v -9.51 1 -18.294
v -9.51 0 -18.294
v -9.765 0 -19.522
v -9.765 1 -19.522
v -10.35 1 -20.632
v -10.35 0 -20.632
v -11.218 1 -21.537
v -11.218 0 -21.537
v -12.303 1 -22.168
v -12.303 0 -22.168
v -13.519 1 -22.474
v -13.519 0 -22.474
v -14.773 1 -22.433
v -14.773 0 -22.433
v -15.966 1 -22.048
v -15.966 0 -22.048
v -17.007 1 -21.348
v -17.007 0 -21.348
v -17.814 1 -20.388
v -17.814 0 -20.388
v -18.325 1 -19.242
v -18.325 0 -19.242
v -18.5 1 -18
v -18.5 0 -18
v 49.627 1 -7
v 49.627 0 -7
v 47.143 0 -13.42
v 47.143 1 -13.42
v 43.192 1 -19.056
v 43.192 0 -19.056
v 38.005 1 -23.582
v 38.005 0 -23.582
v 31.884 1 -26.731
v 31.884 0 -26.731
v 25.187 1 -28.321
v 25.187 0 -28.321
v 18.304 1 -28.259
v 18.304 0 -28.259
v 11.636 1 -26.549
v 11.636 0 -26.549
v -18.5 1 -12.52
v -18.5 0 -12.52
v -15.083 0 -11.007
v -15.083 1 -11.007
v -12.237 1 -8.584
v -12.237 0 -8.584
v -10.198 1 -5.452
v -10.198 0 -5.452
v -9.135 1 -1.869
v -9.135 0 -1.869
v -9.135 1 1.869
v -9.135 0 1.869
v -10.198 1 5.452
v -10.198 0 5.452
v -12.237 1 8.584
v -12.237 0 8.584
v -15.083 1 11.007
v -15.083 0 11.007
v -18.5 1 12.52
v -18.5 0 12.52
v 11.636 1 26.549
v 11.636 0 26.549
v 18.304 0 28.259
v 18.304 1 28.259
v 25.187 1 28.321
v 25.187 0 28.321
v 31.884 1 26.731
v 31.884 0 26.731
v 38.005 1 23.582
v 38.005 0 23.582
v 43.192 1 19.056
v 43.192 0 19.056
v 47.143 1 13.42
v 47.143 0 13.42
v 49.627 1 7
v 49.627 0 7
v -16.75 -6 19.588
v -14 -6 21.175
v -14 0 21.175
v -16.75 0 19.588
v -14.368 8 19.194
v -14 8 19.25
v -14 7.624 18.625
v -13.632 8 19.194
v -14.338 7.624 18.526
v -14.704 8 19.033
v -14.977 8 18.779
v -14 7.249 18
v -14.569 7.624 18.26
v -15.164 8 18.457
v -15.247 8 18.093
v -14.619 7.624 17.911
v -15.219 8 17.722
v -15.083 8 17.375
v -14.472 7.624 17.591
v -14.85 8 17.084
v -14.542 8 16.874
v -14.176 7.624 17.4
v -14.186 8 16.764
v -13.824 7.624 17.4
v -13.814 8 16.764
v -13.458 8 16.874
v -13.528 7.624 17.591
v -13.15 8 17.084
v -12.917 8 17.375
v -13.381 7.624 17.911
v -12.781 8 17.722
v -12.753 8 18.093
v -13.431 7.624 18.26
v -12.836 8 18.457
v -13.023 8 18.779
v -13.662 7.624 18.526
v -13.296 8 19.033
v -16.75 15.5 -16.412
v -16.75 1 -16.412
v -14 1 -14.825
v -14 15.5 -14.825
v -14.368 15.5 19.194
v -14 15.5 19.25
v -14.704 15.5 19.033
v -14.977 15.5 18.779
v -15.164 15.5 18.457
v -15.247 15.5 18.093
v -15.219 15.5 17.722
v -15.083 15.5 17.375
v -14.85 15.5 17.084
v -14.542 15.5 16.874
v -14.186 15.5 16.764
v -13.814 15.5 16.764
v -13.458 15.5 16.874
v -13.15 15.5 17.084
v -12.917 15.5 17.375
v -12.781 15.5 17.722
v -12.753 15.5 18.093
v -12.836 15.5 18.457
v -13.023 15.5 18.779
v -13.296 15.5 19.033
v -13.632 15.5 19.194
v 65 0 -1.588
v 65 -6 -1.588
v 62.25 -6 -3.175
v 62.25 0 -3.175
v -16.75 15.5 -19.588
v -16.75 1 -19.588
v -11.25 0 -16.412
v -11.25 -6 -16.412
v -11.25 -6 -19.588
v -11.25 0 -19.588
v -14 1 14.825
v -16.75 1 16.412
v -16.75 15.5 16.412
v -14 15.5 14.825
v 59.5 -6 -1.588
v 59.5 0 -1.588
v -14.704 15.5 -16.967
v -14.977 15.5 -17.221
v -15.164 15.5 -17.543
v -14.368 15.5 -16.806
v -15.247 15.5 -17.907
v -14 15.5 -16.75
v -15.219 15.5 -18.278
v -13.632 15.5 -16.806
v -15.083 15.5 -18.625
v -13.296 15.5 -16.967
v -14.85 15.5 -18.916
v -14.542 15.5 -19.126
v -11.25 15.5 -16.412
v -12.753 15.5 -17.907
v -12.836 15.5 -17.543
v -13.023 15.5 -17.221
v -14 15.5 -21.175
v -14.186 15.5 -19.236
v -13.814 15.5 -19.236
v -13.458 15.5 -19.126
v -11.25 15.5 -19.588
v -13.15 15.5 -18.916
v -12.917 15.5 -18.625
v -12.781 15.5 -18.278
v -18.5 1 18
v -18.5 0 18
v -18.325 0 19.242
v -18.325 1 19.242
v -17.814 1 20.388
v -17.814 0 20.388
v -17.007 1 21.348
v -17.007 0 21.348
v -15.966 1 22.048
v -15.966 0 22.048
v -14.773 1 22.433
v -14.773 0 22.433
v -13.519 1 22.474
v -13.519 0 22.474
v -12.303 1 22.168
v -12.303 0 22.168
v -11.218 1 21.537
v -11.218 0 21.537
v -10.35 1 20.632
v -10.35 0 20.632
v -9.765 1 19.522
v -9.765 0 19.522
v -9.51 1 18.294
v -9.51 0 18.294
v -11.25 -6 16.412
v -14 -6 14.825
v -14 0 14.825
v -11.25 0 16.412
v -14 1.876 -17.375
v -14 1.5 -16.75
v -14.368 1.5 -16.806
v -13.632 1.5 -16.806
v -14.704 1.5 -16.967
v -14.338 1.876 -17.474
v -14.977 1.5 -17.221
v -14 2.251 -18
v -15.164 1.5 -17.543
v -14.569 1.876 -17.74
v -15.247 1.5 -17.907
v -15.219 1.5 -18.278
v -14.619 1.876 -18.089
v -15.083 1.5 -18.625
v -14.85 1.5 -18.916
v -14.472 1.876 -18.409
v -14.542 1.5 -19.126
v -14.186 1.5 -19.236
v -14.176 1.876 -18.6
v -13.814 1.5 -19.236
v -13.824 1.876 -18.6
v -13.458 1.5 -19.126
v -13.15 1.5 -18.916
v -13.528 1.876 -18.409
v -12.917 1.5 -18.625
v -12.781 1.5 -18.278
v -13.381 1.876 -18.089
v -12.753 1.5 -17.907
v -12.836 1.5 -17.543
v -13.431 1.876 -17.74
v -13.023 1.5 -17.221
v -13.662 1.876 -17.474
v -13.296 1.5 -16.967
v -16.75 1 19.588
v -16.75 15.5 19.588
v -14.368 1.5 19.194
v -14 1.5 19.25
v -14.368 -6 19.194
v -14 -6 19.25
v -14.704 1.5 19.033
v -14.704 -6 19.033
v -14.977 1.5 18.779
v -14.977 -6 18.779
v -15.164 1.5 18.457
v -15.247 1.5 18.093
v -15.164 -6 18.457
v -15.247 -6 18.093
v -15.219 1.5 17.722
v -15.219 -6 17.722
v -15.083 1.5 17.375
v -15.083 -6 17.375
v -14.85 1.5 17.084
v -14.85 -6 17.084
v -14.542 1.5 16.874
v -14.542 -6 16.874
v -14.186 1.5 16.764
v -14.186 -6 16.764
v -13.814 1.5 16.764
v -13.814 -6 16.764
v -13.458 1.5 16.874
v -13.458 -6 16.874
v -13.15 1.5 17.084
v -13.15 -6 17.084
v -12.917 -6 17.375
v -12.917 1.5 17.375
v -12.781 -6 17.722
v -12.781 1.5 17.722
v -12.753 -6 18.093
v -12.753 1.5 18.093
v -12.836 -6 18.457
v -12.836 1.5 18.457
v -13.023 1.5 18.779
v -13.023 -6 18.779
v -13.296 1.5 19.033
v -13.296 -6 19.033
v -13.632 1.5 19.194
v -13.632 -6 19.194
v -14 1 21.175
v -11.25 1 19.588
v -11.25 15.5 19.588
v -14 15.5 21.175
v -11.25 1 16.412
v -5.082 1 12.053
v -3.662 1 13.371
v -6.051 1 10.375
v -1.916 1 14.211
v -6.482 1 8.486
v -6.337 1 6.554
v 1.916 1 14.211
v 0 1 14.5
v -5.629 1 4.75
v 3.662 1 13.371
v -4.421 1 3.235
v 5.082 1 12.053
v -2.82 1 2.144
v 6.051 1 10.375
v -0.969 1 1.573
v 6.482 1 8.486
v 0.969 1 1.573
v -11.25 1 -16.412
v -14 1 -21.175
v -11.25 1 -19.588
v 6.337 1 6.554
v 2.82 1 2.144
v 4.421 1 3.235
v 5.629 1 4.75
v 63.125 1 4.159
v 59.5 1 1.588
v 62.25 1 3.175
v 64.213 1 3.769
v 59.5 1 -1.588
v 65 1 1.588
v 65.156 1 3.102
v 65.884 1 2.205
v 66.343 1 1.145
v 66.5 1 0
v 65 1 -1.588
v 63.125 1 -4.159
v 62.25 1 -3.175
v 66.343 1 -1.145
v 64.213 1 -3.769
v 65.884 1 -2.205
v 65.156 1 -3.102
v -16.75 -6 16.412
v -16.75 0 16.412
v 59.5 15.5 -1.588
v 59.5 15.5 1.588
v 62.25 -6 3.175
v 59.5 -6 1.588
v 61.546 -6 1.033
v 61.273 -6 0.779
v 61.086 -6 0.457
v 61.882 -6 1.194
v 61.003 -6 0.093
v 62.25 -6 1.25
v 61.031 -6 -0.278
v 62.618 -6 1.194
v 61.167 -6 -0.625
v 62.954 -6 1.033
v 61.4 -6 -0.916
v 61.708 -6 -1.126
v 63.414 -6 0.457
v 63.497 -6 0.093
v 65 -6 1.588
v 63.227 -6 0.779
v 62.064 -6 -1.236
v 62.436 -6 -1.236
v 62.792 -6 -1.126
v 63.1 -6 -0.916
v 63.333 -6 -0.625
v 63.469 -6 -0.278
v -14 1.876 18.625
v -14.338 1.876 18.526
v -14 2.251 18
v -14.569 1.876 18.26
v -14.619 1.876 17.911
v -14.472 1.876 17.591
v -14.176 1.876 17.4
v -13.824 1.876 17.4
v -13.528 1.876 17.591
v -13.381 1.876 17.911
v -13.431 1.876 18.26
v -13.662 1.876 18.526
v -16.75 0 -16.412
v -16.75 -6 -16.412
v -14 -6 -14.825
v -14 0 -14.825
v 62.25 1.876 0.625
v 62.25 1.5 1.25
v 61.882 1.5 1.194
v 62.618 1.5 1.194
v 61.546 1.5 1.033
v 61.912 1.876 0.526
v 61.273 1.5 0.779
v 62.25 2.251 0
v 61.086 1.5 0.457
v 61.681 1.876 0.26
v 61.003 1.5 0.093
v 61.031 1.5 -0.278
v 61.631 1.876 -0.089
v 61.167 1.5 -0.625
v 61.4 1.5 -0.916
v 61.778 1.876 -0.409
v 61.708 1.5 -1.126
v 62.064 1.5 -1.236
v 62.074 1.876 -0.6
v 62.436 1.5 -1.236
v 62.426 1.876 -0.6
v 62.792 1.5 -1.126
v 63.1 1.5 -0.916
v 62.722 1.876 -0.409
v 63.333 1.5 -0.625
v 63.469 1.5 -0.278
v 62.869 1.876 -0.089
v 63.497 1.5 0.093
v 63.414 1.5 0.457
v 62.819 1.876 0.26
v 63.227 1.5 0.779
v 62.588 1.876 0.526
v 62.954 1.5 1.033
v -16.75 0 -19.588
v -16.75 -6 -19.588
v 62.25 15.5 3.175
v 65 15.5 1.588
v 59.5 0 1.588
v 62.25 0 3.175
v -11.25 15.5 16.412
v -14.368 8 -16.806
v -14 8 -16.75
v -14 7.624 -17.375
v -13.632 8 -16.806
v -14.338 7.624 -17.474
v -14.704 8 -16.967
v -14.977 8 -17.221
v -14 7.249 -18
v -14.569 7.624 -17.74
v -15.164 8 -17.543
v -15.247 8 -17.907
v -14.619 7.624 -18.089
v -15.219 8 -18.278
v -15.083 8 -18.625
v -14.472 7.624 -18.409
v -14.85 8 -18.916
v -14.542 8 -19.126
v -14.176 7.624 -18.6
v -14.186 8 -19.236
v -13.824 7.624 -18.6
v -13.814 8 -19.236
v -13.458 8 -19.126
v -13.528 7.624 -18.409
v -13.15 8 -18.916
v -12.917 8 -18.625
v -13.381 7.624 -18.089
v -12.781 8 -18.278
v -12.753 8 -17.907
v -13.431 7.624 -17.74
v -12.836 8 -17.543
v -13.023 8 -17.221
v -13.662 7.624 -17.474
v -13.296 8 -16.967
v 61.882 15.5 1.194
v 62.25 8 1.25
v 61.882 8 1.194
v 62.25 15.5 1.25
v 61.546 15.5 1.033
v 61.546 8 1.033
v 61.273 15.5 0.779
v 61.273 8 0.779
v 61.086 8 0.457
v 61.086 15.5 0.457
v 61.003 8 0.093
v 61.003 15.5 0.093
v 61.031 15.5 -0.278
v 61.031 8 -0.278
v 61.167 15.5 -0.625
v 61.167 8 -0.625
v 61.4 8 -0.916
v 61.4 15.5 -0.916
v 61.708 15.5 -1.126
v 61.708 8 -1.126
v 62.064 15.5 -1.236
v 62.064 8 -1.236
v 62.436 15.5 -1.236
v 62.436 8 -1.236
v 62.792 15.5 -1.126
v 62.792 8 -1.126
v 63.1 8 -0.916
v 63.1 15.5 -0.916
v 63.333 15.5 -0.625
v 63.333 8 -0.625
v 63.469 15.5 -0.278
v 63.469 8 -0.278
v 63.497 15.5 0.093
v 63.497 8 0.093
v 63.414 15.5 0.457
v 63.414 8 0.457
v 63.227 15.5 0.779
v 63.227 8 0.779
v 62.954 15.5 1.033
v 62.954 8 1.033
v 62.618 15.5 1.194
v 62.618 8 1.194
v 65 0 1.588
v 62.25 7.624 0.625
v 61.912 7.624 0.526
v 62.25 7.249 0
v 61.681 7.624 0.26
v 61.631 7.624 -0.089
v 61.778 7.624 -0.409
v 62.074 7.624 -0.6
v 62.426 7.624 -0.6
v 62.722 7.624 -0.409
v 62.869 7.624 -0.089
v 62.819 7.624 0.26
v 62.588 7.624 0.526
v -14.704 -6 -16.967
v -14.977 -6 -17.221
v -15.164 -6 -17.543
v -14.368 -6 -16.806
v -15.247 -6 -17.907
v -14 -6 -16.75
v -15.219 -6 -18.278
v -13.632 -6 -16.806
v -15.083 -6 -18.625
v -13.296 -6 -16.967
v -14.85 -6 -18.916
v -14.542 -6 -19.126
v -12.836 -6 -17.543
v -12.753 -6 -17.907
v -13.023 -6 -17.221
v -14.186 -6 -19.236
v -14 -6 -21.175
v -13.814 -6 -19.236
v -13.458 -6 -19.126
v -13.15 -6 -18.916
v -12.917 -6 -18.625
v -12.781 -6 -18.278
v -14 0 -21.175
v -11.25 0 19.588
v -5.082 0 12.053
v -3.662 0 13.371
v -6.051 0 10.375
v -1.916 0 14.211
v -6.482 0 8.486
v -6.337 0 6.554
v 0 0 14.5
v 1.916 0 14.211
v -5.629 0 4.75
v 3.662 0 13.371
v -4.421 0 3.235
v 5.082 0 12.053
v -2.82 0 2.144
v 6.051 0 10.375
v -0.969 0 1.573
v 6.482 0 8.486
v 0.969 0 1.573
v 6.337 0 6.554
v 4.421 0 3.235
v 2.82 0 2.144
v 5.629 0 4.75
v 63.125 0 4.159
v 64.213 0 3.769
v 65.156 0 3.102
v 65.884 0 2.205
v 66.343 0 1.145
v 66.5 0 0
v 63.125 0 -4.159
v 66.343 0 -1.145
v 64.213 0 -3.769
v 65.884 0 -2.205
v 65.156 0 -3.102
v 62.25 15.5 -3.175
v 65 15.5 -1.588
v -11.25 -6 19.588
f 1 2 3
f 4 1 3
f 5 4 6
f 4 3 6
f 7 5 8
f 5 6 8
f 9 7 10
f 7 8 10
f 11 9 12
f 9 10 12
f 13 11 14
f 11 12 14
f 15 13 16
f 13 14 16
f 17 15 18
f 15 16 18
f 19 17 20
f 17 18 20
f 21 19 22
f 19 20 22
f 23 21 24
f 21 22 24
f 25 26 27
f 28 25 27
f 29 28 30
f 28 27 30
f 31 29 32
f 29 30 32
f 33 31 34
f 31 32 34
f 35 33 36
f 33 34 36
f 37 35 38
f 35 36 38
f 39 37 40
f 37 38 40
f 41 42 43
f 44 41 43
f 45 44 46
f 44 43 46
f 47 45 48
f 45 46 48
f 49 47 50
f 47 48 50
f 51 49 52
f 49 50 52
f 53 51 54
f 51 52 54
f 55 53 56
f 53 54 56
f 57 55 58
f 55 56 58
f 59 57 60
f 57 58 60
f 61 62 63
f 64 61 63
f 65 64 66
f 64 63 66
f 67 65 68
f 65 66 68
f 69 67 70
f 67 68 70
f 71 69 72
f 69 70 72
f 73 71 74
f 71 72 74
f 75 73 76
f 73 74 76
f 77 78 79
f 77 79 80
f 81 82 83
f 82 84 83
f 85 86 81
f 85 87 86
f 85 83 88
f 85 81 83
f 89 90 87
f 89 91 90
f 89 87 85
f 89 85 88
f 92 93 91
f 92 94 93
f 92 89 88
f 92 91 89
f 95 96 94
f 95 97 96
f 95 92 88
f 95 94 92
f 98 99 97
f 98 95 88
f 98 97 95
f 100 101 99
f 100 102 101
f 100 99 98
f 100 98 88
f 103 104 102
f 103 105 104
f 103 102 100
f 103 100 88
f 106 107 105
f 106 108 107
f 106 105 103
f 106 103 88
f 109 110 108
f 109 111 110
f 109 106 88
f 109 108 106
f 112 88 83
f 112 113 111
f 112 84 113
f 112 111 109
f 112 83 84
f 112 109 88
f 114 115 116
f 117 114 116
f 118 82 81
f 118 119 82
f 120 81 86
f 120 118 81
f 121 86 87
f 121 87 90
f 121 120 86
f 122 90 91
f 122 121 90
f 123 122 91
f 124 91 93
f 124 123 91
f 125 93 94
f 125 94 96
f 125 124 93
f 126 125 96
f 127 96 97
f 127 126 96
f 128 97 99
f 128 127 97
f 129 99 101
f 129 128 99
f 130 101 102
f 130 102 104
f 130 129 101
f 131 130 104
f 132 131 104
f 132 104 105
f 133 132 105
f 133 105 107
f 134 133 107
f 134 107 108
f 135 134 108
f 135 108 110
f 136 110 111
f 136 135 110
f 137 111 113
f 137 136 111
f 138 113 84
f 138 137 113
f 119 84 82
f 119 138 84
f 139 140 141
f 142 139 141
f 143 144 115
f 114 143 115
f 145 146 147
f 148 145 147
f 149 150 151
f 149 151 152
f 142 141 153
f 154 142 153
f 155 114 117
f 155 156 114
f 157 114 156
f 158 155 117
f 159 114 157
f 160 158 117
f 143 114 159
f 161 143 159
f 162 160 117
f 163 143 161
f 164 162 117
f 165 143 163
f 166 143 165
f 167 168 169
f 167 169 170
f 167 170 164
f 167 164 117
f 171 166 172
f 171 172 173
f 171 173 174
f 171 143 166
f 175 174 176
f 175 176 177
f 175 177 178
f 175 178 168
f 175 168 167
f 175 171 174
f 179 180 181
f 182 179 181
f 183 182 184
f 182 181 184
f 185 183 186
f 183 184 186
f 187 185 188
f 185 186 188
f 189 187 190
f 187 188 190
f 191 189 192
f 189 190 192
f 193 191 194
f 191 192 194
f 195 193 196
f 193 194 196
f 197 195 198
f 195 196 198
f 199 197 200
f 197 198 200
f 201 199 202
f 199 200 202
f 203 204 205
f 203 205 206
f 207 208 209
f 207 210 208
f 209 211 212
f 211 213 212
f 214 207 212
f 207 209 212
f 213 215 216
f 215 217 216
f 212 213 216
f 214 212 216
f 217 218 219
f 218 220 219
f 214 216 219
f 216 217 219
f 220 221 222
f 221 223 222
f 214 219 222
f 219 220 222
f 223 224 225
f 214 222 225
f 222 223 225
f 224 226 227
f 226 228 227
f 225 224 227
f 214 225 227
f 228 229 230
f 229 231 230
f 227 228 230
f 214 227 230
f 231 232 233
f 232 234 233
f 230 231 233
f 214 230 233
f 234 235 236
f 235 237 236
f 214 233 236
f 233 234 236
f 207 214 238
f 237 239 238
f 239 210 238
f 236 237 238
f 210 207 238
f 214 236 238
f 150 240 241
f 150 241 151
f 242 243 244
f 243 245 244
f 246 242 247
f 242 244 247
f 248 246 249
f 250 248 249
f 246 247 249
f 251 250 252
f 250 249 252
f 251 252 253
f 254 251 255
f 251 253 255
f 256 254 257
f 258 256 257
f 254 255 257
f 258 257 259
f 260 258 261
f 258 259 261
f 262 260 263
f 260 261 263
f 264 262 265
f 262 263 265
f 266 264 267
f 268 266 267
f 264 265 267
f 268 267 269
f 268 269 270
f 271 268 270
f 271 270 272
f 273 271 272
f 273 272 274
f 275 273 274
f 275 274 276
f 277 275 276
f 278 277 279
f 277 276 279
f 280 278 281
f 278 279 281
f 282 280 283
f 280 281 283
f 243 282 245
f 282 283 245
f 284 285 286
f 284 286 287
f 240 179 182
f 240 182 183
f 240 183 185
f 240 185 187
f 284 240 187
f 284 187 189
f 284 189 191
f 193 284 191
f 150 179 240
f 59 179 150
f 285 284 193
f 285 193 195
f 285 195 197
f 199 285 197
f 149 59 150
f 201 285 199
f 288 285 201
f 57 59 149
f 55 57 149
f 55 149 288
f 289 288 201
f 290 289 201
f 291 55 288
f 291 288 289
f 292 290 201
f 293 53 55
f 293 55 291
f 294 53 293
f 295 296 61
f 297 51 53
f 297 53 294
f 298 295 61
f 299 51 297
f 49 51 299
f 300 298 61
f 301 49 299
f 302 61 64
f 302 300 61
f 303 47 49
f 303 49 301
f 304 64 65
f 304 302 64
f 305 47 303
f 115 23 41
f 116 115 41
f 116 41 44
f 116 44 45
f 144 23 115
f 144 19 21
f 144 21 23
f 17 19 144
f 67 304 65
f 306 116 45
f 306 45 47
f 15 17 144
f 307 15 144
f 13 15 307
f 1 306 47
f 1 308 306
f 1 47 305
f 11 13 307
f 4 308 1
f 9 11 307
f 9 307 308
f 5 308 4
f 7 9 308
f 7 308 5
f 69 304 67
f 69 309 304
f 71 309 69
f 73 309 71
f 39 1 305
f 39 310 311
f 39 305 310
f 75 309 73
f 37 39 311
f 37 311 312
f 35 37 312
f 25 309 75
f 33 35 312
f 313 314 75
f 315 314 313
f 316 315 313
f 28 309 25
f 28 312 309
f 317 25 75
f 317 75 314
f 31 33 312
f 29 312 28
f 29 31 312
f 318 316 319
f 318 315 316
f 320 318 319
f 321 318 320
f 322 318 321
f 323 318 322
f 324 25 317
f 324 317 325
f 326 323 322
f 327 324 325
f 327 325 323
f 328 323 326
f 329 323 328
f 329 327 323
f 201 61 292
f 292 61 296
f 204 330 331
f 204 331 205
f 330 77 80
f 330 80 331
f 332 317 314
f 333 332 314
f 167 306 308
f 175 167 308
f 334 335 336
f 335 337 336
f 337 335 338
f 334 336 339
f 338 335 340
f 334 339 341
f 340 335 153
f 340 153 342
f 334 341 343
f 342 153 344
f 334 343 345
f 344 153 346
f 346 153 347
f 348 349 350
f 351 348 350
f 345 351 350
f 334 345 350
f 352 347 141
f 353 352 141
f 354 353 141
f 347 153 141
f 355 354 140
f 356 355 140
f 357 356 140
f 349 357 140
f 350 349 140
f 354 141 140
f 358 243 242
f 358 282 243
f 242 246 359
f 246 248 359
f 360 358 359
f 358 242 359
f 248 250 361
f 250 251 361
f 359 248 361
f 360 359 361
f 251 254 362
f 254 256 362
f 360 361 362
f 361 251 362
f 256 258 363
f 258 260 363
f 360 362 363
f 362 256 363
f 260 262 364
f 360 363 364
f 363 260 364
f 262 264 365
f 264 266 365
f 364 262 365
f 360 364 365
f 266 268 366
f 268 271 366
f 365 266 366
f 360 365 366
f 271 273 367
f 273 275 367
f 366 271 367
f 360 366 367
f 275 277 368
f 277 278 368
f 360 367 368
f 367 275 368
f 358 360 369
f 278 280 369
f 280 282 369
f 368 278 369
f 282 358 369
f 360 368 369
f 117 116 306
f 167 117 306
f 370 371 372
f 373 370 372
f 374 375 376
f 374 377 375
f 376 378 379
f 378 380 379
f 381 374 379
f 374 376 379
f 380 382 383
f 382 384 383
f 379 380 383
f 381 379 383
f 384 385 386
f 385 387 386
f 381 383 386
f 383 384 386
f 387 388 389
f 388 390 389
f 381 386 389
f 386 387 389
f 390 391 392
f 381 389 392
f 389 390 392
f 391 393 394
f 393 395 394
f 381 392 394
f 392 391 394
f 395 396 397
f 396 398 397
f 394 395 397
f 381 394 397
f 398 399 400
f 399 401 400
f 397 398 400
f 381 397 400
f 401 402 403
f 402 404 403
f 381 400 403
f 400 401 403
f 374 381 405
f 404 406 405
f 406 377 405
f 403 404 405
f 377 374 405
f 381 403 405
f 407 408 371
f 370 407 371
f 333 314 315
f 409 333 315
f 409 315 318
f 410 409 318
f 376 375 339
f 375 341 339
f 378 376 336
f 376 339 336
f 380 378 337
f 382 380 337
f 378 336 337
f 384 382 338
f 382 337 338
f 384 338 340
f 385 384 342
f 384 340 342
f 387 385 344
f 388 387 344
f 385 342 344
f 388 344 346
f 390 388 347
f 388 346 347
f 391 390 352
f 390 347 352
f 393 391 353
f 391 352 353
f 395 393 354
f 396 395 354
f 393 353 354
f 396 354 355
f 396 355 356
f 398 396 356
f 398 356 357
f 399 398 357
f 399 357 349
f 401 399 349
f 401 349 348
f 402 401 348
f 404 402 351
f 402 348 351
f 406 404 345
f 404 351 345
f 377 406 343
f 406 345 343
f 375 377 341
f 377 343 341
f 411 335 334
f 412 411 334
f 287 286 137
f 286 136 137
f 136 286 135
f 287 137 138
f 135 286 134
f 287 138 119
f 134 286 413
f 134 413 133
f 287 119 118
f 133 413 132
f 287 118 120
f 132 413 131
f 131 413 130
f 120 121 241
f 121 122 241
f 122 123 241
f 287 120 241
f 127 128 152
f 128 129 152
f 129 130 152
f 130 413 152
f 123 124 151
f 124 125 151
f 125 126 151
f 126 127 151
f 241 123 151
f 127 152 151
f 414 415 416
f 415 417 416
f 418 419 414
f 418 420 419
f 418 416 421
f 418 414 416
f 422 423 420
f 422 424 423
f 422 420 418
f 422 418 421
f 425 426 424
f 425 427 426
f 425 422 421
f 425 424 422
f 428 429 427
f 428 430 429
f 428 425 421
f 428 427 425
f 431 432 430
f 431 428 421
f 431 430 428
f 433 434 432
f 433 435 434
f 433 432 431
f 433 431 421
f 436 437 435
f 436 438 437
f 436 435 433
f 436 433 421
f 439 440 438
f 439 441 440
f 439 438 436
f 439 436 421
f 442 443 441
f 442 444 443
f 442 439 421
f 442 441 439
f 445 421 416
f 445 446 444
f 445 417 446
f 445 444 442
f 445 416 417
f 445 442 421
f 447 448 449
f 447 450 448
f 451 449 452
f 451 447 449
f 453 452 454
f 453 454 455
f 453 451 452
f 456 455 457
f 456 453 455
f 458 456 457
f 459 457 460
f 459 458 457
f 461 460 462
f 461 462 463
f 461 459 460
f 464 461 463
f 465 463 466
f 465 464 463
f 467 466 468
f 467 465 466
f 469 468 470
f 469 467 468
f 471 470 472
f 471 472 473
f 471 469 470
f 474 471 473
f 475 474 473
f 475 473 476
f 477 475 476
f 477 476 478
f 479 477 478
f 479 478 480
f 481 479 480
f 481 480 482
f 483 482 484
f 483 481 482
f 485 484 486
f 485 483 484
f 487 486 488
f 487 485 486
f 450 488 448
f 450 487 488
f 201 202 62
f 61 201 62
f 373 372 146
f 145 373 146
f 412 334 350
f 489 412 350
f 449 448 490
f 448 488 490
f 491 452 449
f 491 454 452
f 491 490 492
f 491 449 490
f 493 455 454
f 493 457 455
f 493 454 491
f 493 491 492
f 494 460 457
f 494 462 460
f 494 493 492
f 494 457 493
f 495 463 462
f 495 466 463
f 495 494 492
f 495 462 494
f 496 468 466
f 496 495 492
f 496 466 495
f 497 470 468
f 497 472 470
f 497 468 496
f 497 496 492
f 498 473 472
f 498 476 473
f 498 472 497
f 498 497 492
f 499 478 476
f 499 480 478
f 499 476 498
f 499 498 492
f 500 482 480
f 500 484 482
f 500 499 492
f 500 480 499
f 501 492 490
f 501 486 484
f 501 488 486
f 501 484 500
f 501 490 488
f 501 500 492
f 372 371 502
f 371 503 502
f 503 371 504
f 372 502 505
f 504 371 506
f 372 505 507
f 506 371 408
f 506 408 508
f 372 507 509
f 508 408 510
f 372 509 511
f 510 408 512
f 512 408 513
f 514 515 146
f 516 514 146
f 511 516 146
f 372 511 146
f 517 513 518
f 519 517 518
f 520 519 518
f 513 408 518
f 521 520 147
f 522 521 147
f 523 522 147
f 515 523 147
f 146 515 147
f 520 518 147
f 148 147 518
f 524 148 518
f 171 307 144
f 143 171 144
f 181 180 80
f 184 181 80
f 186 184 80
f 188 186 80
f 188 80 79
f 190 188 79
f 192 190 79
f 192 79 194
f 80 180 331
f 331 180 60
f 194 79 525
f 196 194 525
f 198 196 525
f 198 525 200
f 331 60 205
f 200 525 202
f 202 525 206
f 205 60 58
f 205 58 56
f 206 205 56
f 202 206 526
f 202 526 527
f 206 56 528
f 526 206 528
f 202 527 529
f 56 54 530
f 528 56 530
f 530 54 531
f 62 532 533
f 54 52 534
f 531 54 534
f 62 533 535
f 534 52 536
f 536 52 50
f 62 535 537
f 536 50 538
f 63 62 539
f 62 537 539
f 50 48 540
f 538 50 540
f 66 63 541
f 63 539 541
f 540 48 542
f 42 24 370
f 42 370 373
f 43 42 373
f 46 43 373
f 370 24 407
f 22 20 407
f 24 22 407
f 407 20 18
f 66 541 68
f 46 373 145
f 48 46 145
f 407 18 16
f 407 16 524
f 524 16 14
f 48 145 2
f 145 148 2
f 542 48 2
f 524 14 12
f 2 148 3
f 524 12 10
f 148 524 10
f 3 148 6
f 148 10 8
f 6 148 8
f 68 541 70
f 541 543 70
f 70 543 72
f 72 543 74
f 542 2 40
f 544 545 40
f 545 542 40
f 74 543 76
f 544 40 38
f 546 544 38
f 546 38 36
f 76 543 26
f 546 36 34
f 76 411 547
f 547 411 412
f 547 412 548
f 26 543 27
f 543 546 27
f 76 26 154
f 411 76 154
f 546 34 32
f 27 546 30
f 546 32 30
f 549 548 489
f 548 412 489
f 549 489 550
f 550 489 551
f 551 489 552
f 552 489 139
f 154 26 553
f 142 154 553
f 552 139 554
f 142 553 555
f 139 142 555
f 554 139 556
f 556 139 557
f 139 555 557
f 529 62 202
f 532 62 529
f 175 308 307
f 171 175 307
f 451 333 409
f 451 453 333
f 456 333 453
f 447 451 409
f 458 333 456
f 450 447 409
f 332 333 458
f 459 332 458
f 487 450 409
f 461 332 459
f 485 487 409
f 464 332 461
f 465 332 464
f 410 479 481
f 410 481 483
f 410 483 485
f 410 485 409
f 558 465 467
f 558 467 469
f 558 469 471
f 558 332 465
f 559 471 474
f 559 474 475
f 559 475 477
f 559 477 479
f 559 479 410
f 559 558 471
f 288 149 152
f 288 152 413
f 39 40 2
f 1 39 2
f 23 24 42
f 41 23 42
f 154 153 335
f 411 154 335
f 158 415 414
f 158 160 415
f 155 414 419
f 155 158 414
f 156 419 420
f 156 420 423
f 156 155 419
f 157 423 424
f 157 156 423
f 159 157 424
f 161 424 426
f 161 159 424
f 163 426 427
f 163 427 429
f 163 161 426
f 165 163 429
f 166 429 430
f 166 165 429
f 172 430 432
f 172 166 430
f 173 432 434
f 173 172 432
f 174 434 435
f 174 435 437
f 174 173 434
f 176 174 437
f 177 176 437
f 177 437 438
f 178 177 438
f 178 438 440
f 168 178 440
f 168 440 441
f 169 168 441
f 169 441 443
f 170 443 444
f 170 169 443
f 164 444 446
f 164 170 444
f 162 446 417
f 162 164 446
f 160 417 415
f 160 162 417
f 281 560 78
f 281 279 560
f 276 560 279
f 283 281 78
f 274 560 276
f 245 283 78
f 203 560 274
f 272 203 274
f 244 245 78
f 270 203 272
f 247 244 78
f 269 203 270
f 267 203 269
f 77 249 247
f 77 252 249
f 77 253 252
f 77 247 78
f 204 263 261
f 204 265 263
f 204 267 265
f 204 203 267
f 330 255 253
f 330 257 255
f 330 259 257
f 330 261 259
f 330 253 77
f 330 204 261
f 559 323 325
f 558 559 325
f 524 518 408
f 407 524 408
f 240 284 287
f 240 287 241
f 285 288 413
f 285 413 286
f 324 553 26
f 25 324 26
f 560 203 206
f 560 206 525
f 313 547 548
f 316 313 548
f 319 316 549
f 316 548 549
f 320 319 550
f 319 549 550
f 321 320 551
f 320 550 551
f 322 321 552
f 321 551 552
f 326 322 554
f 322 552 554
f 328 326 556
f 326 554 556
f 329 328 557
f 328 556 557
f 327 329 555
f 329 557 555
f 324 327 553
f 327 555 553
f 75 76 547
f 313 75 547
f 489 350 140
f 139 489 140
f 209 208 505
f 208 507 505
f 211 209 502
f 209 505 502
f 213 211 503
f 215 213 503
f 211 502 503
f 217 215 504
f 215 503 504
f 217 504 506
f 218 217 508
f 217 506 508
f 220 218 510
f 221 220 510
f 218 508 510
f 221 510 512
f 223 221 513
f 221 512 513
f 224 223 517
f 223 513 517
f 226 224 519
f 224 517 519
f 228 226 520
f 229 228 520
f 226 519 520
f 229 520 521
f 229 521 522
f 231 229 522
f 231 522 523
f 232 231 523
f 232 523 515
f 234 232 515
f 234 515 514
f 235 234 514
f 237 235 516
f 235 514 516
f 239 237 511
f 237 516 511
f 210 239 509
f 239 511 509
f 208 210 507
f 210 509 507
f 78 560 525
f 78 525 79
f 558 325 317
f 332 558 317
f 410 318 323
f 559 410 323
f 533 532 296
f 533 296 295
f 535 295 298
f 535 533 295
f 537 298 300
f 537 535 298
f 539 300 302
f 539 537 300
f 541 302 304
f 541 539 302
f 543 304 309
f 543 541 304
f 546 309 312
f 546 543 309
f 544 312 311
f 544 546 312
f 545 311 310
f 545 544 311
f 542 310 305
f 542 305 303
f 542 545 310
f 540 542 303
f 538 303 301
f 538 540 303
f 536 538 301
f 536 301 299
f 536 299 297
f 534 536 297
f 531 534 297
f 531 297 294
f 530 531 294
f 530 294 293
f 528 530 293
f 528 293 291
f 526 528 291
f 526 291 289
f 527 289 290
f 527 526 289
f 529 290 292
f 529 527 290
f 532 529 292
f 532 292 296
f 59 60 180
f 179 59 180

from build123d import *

# Parameters (mm, degrees)
SKETCH1_R                  = 6.5
BOSS_EXTRUDE1_DEPTH        = 1
BOSS_EXTRUDE2_DEPTH        = 14.5
BOSS_EXTRUDE2_DEPTH_BACK   = 7
M3_TAPPED_HOLE1_AT_2_COUNT = 2
M3_TAPPED_HOLE1_AT_2_PITCH = 78.345788017
M3_TAPPED_HOLE1_AT_3_COUNT = 2
M3_TAPPED_HOLE1_AT_3_PITCH = 36


with BuildPart() as part:
    # Sketch1 → Boss-Extrude1 (new body)
    with BuildSketch(Plane(origin=(0, 0, 0), x_dir=(1, 0, 0), z_dir=(0, 1, 0))):
        with BuildLine():
            Line((11.636363636, 26.548917894), (-9.50963812, 18.294364031))
            ThreePointArc((-9.50963812, 18.294364031), (-14.147260888, 22.497589825), (-18.5, 18))
            Line((-18.5, 18), (-18.5, 12.519984026))
            ThreePointArc((-18.5, 12.519984026), (-9, 0), (-18.5, -12.519984026))
            Line((-18.5, -12.519984026), (-18.5, -18))
            ThreePointArc((-18.5, -18), (-14.147260888, -22.497589825), (-9.50963812, -18.294364031))
            Line((-9.50963812, -18.294364031), (11.636363636, -26.548917894))
            ThreePointArc((11.636363636, -26.548917894), (35.040161132, -25.341748118), (49.626979567, -7))
            Line((49.626979567, -7), (63.125355805, -4.158876316))
            ThreePointArc((63.125355805, -4.158876316), (66.5, 0), (63.125355805, 4.158876316))
            Line((63.125355805, 4.158876316), (49.626979567, 7))
            ThreePointArc((49.626979567, 7), (35.040161132, 25.341748118), (11.636363636, 26.548917894))
        make_face()
        with Locations(Location((0, -8, 0), (0, 0, 270))):
            Circle(SKETCH1_R, mode=Mode.SUBTRACT)
    extrude(amount=BOSS_EXTRUDE1_DEPTH)

    # Sketch2 → Boss-Extrude2 (add, two sides: drawn at the far end of the back side and taken through both)
    with BuildSketch(Plane(origin=(0, 1, 0), x_dir=(1, 0, 0), z_dir=(0, 1, 0)).offset(-BOSS_EXTRUDE2_DEPTH_BACK)):
        Polygon((-11.25, 16.41228676), (-11.25, 19.58771324), (-14, 21.175426481), (-16.75, 19.58771324), (-16.75, 16.41228676), (-14, 14.824573519), align=None)
        Polygon((-14, -14.824573519), (-11.25, -16.41228676), (-11.25, -19.58771324), (-14, -21.175426481), (-16.75, -19.58771324), (-16.75, -16.41228676), align=None)
        Polygon((65, 1.58771324), (62.25, 3.175426481), (59.5, 1.58771324), (59.5, -1.58771324), (62.25, -3.175426481), (65, -1.58771324), align=None)
    extrude(amount=BOSS_EXTRUDE2_DEPTH + BOSS_EXTRUDE2_DEPTH_BACK)

    # Sketch4 → M3 Tapped Hole1 (revolve, cut)
    with BuildSketch(Plane(origin=(-14, 15.5, -18), x_dir=(0, 0, 1), z_dir=(1, 0, 0))):
        Polygon((0, 0), (0, 8.251075774), (1.25, 7.5), (1.25, 0), align=None)
    m3_tapped_hole1 = revolve(axis=Axis((-14, 21.85, -18), (0, -1, 0)), mode=Mode.SUBTRACT)

    # M3 Tapped Hole1 at 2: M3 Tapped Hole1 ×2
    with Locations(*[Vector(0.9732495125772933, 0, 0.22975070460841018) * (i * M3_TAPPED_HOLE1_AT_2_PITCH) for i in range(1, M3_TAPPED_HOLE1_AT_2_COUNT)]):
        add(m3_tapped_hole1, mode=Mode.SUBTRACT)

    # M3 Tapped Hole1 at 3: M3 Tapped Hole1 ×2
    with Locations(*[(0, 0, i * M3_TAPPED_HOLE1_AT_3_PITCH) for i in range(1, M3_TAPPED_HOLE1_AT_3_COUNT)]):
        add(m3_tapped_hole1, mode=Mode.SUBTRACT)

    # Mirror2: M3 Tapped Hole1 across plane
    add(m3_tapped_hole1.mirror(Plane.ZX.offset(4.75)), mode=Mode.SUBTRACT)

    # Mirror2 copy 1 sketch → Mirror2 copy 1 (revolve, cut)
    with BuildSketch(Plane(origin=(62.25, -6, 0), x_dir=(0, 0, 1), z_dir=(1, 0, 0))):
        Polygon((0, 0), (0, -8.251075774), (1.25, -7.5), (1.25, 0), align=None)
    revolve(axis=Axis((62.25, -12.35, 0), (0, -1, 0)), mode=Mode.SUBTRACT)

    # Mirror2 copy 2 sketch → Mirror2 copy 2 (revolve, cut)
    with BuildSketch(Plane(origin=(-14, -6, 18), x_dir=(0, 0, 1), z_dir=(1, 0, 0))):
        Polygon((0, 0), (0, -8.251075774), (1.25, -7.5), (1.25, 0), align=None)
    revolve(axis=Axis((-14, -12.35, 18), (0, -1, 0)), mode=Mode.SUBTRACT)


solid = part.part
